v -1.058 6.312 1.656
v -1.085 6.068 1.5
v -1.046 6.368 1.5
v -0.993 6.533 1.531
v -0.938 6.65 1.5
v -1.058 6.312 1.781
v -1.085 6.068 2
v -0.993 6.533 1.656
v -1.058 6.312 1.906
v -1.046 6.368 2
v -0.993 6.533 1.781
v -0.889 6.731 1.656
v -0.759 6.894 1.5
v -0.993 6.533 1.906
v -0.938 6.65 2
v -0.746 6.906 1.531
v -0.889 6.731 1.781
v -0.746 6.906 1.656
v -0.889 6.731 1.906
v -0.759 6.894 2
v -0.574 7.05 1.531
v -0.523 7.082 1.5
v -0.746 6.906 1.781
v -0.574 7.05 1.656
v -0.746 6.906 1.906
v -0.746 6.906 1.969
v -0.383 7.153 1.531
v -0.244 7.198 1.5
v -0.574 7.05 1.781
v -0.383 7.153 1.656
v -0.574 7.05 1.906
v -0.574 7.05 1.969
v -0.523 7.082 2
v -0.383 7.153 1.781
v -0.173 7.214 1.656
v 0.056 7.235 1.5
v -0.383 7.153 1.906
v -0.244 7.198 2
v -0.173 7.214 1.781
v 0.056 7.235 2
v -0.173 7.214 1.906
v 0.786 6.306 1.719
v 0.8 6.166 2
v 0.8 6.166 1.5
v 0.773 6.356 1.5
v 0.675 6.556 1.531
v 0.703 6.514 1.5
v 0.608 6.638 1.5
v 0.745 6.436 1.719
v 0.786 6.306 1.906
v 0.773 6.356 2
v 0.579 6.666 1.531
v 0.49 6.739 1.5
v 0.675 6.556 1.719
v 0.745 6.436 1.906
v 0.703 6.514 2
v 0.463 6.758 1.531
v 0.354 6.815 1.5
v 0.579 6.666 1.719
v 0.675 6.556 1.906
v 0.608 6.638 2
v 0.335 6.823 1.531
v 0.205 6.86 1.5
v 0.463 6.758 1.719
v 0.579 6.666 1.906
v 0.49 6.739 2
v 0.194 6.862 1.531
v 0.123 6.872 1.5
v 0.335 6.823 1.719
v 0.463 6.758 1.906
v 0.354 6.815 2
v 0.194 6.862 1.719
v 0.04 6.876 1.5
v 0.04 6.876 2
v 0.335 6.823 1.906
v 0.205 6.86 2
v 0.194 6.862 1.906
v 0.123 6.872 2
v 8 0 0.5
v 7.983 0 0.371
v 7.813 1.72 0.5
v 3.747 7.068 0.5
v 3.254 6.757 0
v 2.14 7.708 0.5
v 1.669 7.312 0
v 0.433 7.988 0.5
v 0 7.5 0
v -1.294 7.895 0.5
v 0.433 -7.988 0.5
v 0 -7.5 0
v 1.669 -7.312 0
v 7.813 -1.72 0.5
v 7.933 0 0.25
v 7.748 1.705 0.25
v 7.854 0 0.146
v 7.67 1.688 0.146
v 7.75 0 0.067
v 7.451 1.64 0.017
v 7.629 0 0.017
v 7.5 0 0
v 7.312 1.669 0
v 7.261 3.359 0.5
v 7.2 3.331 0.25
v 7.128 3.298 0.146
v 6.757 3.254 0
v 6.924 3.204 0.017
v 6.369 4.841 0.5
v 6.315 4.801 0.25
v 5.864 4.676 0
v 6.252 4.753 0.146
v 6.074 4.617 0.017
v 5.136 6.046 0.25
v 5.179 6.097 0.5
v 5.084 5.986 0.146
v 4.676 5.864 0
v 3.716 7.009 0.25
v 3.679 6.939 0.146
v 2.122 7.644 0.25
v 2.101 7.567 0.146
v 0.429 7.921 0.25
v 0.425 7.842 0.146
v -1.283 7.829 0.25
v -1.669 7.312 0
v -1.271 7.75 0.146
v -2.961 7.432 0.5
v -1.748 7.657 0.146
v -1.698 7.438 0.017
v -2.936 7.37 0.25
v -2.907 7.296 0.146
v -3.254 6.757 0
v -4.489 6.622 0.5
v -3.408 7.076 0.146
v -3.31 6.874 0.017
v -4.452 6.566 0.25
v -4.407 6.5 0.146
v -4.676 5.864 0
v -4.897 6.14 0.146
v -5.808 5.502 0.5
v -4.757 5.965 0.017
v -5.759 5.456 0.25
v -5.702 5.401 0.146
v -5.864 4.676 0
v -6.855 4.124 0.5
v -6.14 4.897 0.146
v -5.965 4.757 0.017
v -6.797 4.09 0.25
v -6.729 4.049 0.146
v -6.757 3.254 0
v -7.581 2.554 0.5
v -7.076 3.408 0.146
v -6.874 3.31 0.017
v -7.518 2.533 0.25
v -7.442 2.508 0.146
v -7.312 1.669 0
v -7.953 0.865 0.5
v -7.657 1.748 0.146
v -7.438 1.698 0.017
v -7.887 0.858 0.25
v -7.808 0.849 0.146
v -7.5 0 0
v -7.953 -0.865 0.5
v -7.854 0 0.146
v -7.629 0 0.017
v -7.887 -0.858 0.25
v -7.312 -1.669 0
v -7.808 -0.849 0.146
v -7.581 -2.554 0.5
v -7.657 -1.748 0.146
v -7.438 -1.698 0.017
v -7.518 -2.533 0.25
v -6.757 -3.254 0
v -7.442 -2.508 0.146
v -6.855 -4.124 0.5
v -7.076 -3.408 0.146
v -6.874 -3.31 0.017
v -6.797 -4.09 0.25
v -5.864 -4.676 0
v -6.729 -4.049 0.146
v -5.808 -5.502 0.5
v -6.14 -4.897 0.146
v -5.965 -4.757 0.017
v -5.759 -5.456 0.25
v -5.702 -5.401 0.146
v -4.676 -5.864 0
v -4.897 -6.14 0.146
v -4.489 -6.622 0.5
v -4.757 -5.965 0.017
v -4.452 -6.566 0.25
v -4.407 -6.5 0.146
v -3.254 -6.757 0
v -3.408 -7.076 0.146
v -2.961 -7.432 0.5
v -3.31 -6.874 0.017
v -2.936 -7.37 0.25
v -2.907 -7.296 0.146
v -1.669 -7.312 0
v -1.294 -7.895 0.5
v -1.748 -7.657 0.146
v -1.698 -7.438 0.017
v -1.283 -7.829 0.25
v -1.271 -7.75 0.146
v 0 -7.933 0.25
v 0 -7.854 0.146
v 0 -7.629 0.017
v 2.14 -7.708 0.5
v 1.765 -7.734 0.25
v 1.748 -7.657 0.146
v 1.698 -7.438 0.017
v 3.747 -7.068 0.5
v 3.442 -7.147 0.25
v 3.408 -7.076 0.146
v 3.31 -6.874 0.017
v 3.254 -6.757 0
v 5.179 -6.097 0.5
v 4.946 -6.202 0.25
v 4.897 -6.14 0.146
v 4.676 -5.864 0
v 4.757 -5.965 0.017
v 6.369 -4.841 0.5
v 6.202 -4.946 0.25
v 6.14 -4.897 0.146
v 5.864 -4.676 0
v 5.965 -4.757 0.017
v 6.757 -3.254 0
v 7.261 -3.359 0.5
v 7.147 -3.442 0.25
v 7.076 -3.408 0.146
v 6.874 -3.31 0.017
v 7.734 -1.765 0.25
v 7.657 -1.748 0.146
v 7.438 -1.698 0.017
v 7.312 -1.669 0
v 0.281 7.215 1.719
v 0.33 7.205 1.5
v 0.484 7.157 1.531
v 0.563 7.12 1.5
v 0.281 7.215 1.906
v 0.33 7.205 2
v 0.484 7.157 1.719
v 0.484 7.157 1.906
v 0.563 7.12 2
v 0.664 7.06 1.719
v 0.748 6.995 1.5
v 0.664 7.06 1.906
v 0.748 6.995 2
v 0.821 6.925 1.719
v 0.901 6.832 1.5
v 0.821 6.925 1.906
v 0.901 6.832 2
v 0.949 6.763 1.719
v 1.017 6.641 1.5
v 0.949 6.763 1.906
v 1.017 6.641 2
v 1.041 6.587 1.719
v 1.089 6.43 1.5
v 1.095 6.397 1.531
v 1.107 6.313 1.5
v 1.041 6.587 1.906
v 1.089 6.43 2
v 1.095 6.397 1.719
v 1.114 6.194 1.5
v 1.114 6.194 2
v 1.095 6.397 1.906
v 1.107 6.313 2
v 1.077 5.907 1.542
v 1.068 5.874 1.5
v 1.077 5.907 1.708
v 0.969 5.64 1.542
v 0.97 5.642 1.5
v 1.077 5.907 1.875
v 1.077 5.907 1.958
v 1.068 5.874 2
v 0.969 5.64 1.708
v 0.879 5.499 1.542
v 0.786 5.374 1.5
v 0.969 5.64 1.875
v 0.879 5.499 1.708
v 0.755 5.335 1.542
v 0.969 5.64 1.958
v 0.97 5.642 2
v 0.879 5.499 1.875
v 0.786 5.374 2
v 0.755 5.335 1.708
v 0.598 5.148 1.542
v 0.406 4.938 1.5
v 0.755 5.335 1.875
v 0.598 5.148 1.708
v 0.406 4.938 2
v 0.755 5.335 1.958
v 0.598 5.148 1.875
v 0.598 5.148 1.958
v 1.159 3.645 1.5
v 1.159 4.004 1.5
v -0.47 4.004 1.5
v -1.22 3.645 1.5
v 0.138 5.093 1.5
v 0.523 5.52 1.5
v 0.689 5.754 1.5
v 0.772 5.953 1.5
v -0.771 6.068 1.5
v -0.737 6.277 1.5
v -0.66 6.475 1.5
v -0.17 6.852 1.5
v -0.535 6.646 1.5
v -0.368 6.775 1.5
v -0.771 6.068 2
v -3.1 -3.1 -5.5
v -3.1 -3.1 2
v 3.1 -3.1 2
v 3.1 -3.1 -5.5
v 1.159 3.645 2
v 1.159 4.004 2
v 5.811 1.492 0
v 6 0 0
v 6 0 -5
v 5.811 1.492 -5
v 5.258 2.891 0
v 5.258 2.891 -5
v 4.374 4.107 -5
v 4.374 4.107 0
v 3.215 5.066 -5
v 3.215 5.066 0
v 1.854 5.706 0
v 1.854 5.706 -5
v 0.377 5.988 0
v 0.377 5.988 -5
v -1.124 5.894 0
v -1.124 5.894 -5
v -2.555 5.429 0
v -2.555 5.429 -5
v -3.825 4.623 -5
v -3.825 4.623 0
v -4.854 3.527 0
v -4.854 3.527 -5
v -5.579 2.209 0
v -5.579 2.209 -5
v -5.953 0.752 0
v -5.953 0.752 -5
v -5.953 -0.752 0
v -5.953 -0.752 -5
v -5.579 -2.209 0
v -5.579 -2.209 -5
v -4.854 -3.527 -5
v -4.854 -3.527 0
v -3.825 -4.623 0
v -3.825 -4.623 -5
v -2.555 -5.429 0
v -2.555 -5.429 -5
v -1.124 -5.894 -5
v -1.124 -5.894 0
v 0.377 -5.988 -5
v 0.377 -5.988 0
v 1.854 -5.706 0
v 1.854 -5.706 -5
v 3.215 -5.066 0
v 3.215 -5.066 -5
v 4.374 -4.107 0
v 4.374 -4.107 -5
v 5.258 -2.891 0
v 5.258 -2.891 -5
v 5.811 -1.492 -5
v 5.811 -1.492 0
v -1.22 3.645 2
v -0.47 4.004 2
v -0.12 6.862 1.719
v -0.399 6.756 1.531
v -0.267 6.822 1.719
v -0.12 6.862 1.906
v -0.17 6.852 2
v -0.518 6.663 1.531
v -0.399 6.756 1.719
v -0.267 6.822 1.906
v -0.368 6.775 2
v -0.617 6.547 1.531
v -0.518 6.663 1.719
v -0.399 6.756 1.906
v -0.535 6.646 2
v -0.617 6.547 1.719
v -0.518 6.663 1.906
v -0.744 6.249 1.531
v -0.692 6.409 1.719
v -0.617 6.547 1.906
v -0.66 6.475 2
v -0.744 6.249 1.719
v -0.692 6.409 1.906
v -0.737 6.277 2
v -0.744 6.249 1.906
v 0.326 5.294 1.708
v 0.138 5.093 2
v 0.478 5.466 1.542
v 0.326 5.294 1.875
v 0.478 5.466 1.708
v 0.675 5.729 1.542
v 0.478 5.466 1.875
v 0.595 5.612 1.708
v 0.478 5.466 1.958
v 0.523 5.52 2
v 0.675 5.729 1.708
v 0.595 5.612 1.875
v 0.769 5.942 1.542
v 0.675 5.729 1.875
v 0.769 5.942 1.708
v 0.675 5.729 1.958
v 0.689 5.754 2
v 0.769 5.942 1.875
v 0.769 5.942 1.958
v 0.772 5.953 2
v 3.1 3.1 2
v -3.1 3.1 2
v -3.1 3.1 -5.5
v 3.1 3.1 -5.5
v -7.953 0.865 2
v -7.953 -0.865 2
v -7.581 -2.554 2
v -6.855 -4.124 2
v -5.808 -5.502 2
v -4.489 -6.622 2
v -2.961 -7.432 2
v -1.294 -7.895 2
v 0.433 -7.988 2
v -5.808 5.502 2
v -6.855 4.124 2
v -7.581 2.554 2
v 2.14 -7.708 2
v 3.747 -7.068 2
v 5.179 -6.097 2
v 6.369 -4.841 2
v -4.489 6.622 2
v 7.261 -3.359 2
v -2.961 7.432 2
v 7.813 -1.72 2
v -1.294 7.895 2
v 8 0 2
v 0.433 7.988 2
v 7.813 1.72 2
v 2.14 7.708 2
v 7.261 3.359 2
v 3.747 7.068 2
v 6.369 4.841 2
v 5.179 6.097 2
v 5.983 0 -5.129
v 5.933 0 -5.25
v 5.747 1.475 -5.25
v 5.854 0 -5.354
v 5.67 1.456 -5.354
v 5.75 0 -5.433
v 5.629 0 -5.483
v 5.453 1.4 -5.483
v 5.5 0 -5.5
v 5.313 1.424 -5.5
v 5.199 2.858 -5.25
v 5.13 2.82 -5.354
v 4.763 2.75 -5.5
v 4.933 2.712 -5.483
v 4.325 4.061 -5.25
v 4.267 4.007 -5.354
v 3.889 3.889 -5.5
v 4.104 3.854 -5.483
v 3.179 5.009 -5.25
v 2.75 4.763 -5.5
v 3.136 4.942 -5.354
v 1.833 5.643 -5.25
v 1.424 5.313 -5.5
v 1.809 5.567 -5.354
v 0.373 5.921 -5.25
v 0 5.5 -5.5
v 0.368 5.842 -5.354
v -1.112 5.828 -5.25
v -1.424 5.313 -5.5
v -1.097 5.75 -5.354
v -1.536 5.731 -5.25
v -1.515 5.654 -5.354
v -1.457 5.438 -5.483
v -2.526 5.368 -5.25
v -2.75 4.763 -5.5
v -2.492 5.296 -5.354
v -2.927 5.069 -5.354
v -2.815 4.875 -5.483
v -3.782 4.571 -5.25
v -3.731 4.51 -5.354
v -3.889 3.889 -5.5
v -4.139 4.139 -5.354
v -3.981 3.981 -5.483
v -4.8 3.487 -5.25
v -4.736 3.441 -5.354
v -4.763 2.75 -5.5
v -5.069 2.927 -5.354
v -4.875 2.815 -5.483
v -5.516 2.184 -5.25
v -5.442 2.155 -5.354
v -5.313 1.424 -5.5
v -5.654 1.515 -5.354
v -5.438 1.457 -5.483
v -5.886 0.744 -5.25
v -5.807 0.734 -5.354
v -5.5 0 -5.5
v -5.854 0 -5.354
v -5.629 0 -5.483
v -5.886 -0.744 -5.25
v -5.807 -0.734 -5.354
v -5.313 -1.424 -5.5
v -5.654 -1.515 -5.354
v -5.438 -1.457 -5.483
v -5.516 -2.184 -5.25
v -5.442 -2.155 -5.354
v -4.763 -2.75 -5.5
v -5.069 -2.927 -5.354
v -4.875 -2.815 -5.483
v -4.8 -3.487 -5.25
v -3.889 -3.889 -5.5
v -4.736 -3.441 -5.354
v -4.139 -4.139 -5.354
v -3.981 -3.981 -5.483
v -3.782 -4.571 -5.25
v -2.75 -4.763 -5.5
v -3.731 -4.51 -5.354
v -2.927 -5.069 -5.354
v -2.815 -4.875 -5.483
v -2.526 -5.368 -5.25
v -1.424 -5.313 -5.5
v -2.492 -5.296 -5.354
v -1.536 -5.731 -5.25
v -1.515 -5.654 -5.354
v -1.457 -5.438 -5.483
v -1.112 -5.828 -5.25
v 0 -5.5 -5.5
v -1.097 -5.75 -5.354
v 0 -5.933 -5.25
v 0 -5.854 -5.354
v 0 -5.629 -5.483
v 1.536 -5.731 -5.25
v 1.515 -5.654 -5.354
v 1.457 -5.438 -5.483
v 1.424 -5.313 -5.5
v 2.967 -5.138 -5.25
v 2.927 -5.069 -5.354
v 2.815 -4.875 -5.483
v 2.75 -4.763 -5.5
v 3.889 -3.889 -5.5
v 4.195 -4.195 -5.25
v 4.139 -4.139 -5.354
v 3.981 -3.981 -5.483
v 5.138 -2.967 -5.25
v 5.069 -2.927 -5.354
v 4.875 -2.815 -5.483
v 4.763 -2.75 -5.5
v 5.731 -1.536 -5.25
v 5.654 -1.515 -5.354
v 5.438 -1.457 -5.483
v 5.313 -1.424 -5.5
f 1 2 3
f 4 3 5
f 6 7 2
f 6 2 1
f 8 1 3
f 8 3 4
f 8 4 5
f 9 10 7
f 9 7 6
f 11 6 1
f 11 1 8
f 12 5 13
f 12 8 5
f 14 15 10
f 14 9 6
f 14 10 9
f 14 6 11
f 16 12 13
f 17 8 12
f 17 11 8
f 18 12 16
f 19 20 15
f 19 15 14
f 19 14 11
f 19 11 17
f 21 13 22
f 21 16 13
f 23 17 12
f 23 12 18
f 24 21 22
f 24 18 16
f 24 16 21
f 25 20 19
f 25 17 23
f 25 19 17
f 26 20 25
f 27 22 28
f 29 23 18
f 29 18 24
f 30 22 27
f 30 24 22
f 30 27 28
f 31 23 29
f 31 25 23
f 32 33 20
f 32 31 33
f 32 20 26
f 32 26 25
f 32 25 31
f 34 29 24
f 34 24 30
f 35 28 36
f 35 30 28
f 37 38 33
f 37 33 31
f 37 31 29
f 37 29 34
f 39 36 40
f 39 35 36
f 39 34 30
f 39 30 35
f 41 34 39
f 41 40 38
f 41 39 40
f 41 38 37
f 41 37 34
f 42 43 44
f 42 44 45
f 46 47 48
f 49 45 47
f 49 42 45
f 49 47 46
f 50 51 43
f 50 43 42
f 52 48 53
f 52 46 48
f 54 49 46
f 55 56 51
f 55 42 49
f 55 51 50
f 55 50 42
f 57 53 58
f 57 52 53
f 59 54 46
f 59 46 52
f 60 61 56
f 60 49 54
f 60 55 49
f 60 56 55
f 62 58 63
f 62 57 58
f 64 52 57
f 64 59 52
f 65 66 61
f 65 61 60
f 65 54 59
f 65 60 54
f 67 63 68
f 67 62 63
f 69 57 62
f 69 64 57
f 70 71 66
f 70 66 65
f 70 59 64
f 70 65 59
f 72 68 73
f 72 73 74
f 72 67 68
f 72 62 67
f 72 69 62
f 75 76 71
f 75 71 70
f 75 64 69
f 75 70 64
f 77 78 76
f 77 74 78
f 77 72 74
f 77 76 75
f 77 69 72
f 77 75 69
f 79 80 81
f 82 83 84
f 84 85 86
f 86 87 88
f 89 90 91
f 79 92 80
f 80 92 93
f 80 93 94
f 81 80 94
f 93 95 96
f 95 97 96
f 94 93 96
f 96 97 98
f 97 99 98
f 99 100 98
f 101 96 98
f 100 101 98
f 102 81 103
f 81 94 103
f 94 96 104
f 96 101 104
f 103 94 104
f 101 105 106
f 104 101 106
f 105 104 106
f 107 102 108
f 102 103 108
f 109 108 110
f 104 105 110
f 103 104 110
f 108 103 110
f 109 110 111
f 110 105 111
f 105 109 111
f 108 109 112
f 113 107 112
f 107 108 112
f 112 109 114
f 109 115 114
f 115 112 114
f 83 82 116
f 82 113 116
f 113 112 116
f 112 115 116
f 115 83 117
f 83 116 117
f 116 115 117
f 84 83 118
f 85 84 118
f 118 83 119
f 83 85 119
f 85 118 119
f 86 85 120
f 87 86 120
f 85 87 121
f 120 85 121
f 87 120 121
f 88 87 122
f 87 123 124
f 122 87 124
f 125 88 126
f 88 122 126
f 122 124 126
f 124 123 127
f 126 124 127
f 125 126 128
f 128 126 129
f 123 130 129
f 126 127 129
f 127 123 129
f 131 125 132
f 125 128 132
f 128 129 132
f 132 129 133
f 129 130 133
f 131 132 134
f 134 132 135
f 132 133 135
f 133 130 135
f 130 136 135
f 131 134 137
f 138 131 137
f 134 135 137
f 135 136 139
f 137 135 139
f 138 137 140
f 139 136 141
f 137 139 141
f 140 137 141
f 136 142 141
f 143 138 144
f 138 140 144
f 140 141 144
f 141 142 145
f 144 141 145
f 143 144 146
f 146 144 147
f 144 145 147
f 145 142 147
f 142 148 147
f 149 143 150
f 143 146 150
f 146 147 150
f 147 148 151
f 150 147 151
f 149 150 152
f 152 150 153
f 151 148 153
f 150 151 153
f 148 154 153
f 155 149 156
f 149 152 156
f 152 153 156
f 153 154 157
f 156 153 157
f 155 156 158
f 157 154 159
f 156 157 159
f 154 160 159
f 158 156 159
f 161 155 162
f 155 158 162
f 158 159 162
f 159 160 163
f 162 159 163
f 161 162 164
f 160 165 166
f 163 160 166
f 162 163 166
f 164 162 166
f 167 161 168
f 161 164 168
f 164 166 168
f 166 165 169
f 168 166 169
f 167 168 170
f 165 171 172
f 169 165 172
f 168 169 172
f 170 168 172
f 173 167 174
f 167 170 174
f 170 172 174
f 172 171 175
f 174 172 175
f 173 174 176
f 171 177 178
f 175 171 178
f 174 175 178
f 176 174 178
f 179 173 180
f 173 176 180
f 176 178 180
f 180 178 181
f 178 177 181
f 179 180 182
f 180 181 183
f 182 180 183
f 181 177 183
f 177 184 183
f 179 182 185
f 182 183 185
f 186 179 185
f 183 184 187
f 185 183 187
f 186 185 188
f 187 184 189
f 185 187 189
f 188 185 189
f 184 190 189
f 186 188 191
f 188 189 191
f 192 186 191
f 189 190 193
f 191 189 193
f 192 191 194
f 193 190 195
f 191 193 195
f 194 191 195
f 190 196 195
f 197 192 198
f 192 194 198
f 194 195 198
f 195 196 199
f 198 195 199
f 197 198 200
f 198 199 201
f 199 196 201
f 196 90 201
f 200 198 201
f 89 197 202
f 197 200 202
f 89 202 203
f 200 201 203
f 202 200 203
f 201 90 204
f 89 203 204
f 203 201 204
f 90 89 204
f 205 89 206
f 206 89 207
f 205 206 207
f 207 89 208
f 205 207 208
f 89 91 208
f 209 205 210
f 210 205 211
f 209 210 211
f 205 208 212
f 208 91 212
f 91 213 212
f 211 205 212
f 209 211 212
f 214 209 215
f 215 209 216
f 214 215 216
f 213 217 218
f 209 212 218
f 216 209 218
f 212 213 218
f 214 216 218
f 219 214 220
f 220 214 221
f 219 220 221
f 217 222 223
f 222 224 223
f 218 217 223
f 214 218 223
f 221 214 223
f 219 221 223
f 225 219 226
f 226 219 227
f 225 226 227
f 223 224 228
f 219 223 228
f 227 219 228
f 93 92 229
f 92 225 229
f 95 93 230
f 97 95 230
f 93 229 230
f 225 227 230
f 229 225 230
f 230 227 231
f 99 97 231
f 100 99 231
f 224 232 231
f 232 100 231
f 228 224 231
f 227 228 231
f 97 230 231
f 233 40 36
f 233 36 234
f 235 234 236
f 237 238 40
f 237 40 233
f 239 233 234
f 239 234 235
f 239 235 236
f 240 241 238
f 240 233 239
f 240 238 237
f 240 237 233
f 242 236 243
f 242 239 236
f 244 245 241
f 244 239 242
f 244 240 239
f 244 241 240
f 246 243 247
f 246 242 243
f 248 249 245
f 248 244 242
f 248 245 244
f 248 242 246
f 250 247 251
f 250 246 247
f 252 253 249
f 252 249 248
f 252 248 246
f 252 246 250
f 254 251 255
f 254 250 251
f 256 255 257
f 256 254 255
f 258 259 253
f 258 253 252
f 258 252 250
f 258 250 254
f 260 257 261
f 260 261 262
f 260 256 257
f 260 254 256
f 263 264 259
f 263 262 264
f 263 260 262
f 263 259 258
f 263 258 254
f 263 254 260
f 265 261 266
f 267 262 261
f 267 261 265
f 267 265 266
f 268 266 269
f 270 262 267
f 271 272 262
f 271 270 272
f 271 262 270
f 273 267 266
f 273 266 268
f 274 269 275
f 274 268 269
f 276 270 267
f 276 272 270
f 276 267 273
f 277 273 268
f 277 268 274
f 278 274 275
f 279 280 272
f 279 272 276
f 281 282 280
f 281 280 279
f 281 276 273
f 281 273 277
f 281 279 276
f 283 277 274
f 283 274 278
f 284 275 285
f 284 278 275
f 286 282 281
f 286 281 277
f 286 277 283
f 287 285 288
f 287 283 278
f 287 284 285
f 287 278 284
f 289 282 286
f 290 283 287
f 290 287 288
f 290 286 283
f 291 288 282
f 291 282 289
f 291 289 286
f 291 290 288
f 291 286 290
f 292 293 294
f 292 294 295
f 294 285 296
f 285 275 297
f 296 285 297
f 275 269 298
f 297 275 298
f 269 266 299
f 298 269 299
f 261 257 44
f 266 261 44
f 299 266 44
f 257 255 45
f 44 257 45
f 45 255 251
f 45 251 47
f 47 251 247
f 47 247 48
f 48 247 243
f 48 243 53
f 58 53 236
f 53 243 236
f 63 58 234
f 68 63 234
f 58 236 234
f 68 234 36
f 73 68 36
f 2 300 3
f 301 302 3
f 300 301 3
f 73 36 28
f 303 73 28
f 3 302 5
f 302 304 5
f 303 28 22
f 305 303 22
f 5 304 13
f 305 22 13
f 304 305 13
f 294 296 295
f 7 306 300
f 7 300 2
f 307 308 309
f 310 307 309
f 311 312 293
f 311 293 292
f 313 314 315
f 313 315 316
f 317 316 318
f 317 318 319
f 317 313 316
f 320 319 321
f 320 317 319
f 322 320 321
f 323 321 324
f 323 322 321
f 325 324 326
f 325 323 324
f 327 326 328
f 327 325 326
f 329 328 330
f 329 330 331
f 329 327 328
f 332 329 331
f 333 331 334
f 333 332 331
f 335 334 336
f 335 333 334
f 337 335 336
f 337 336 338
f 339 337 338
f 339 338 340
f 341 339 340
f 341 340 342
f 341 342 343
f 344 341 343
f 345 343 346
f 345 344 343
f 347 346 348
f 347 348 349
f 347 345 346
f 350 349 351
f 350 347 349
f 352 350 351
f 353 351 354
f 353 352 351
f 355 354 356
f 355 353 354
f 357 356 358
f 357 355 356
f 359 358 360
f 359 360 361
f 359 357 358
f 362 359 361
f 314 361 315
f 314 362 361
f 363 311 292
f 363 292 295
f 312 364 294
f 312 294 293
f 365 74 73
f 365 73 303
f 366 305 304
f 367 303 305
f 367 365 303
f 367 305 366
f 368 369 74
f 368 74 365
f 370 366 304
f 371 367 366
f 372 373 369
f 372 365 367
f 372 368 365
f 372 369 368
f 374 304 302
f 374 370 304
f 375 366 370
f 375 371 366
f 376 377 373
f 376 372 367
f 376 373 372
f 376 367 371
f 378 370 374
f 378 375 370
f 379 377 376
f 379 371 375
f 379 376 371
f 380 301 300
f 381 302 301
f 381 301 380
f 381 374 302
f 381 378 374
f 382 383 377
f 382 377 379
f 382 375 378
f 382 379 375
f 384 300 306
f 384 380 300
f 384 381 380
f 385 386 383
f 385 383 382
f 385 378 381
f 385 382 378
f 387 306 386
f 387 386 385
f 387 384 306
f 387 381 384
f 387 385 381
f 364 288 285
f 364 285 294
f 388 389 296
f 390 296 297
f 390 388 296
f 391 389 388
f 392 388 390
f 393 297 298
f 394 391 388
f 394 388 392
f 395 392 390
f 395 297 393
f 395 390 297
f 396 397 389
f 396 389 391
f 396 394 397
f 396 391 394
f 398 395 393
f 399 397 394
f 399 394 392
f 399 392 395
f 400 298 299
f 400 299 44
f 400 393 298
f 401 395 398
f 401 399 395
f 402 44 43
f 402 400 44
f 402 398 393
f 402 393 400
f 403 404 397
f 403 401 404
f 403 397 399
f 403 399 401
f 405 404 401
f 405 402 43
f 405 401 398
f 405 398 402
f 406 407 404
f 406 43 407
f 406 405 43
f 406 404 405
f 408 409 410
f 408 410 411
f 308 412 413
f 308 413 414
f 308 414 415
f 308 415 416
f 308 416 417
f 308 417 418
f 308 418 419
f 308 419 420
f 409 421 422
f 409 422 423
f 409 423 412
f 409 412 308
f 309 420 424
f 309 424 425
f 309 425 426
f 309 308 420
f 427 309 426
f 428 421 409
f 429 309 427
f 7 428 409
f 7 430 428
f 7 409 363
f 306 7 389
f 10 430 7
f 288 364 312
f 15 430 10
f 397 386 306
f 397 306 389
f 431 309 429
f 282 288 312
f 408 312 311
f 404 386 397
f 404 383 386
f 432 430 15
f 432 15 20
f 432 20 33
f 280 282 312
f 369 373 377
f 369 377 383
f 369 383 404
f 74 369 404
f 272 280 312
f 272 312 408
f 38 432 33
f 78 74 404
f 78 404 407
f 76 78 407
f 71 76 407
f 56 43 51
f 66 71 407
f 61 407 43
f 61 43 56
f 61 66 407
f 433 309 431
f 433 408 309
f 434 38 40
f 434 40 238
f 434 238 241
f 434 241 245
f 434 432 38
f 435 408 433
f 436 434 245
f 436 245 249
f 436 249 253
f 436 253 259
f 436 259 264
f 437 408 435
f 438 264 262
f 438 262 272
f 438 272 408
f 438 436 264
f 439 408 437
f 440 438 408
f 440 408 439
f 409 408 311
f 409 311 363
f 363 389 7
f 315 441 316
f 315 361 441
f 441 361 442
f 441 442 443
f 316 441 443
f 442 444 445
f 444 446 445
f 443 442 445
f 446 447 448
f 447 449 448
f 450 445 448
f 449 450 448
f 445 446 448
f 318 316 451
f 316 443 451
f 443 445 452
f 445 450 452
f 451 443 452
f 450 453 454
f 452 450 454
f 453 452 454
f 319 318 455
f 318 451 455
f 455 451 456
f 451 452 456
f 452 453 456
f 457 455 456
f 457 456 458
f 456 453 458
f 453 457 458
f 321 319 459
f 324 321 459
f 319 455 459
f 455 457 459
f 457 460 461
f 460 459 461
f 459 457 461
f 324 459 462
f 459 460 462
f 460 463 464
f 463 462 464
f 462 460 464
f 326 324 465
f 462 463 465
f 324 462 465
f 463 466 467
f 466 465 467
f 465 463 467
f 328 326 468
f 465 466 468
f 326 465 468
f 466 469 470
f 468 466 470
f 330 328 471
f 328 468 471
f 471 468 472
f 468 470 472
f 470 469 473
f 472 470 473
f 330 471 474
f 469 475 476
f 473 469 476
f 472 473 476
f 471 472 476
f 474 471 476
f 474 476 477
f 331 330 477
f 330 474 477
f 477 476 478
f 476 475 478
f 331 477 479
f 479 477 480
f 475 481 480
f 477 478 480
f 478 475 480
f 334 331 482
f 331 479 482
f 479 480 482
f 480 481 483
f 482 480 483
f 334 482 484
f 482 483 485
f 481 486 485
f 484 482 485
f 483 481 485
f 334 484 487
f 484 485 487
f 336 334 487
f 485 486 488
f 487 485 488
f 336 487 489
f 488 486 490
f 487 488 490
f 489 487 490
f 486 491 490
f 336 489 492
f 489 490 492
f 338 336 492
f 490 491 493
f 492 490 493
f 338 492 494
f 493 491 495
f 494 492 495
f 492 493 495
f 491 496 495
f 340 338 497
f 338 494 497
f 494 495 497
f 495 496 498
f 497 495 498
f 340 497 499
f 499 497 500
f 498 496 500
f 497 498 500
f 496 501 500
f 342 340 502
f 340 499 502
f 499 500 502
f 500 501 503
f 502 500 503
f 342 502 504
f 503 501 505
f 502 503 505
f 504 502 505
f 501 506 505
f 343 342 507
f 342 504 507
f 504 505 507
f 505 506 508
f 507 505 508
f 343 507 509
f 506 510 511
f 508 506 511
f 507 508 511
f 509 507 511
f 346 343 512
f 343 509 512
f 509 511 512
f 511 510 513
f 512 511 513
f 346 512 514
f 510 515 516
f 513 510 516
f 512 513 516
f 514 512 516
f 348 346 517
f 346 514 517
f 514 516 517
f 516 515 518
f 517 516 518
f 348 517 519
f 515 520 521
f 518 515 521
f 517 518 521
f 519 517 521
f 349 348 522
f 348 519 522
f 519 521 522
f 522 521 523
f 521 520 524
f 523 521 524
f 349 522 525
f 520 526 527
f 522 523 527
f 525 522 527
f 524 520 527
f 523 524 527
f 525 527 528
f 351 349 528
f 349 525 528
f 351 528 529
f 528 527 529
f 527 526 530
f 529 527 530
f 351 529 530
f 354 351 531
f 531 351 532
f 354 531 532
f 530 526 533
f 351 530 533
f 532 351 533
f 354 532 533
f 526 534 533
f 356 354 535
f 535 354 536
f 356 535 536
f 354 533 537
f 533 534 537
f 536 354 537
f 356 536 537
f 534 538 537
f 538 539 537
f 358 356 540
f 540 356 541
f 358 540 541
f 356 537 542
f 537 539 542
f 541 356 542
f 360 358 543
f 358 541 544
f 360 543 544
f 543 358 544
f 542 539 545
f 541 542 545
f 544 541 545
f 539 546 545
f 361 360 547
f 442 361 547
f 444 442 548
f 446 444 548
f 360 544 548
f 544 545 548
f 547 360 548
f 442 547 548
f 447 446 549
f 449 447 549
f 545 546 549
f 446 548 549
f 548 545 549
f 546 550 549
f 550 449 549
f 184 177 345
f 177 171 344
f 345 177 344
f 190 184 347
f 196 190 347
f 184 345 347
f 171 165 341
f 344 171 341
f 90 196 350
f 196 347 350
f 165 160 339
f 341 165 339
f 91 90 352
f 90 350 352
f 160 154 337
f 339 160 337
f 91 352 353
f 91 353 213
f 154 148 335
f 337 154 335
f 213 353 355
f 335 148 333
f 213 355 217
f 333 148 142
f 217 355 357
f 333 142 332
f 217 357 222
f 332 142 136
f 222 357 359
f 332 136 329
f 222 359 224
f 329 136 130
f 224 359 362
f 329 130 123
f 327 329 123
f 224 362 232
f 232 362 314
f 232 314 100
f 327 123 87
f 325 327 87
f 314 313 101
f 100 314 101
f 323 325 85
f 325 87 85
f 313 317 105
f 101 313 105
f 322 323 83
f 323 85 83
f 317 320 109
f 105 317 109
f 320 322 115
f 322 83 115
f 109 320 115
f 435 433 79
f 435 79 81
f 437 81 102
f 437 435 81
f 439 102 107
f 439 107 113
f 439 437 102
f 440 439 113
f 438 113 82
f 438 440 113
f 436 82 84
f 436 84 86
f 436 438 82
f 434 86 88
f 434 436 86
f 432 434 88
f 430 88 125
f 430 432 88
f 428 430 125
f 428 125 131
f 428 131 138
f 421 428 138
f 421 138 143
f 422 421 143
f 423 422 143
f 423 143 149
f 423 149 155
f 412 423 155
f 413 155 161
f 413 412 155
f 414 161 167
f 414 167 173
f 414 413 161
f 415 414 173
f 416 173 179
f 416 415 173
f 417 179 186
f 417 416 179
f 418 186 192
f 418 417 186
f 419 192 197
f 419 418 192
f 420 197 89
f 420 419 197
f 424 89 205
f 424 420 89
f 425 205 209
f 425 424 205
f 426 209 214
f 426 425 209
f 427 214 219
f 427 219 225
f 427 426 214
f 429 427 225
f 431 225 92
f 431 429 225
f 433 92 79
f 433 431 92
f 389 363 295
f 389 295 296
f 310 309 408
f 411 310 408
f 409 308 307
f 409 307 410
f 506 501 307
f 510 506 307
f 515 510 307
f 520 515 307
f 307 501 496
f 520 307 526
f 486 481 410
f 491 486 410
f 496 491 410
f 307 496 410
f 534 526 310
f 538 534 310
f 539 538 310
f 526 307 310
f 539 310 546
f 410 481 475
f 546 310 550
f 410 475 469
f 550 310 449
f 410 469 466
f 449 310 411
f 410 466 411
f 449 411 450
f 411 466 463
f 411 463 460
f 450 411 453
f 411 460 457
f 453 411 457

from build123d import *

# Parameters (mm, degrees)
SKETCH1_R           = 6
SKETCH1_W           = 6.2
SKETCH1_H           = 6.2
BOSS_EXTRUDE1_DEPTH = 5.5
SKETCH1_3_R         = 8
SKETCH1_3_W         = 6.2
SKETCH1_3_H         = 6.2
BOSS_EXTRUDE2_DEPTH = 2
FILLET1_R           = 0.5
CUT_EXTRUDE1_DEPTH  = 0.5


with BuildPart() as part:
    # Sketch1 → Boss-Extrude1 (new body)
    with BuildSketch(Plane.XY):
        Circle(SKETCH1_R)
        Rectangle(SKETCH1_W, SKETCH1_H, mode=Mode.SUBTRACT)
    extrude(amount=-BOSS_EXTRUDE1_DEPTH)

    # Sketch1<3> → Boss-Extrude2 (add)
    with BuildSketch(Plane.XY):
        Circle(SKETCH1_3_R)
        Rectangle(SKETCH1_3_W, SKETCH1_3_H, mode=Mode.SUBTRACT)
    extrude(amount=BOSS_EXTRUDE2_DEPTH)

    # Fillet1
    fillet1_edges = [part.edges().sort_by_distance(p)[0] for p in [
        (-8, 0, 0),
        (-6, 0, -5.5),
    ]]
    fillet(fillet1_edges, radius=FILLET1_R)

    # Sketch2 → Cut-Extrude1 (cut)
    with BuildSketch(Plane.XY.offset(2)):
        with BuildLine():
            Line((-0.770976701, 6.067937408), (-1.085079266, 6.067937408))
            add(Edge.make_bspline(
                [(-1.085079266, 6.067937408), (-1.083032113, 6.109608296), (-1.079011558, 6.19144881), (-1.060183269, 6.310772717), (-1.033242392, 6.424827515), (-0.995150938, 6.532697429), (-0.94784466, 6.635336237), (-0.891114633, 6.732336252), (-0.823920782, 6.823327441), (-0.747714048, 6.907466284), (-0.664945409, 6.984653855), (-0.57563947, 7.051309098), (-0.481794442, 7.107626769), (-0.383695044, 7.154708011), (-0.28023448, 7.190047857), (-0.172351622, 7.216269497), (-0.059572486, 7.232045842), (0.017267536, 7.233741628), (0.056347017, 7.234604075)],
                knots=[0, 0, 0, 0, 1.10065271, 2.161652631, 3.183658789, 4.190468796, 5.17591951, 6.163126047, 7.15150782, 8.156236427, 9.156009102, 10.134482811, 11.092018607, 12.041330605, 13.001268258, 13.972401359, 14.968799086, 16, 16, 16, 16], degree=3))
            add(Edge.make_bspline(
                [(0.056347017, 7.234604075), (0.094725091, 7.233705618), (0.170136635, 7.231940183), (0.28019865, 7.216779154), (0.384975944, 7.193033562), (0.484263711, 7.159718146), (0.577269775, 7.114933719), (0.66469282, 7.06113618), (0.747573631, 6.998916349), (0.822180414, 6.925662535), (0.890688493, 6.847460151), (0.949790749, 6.763972247), (1.000403912, 6.677742961), (1.042591592, 6.58811476), (1.073647731, 6.494243731), (1.097225939, 6.397496529), (1.110553353, 6.296871718), (1.112598776, 6.228765162), (1.113638683, 6.194139331)],
                knots=[0, 0, 0, 0, 1.111607364, 2.184268762, 3.212621178, 4.221274766, 5.211760367, 6.196651075, 7.1921475, 8.207485113, 9.220403448, 10.201281604, 11.166441695, 12.114753415, 13.065576456, 14.026450734, 14.996634279, 16, 16, 16, 16], degree=3))
            add(Edge.make_bspline(
                [(1.113638683, 6.194139331), (1.11194542, 6.145391496), (1.108588609, 6.048751283), (1.079874232, 5.90673642), (1.035027721, 5.769143001), (0.981030364, 5.658405699), (0.92655792, 5.569172205), (0.877470413, 5.4957035), (0.820005602, 5.416598032), (0.753327104, 5.332120694), (0.678814232, 5.241609789), (0.595792068, 5.145119994), (0.503668586, 5.043648224), (0.439010086, 4.974342623), (0.40550567, 4.938430196)],
                knots=[0, 0, 0, 0, 1.184426356, 2.348067706, 3.509069118, 4.696110526, 5.333549288, 6.050745305, 6.844228056, 7.710549037, 8.667450064, 9.695053472, 10.805634456, 12, 12, 12, 12], degree=3))
            Line((0.40550567, 4.938430196), (-0.470195451, 4.003834844))
            Line((-0.470195451, 4.003834844), (1.158510478, 4.003834844))
            Line((1.158510478, 4.003834844), (1.158510478, 3.644860485))
            Line((1.158510478, 3.644860485), (-1.21969465, 3.644860485))
            Line((-1.21969465, 3.644860485), (0.137677145, 5.093378113))
            add(Edge.make_bspline(
                [(0.137677145, 5.093378113), (0.170725032, 5.12787642), (0.234203259, 5.194140606), (0.323985835, 5.290883566), (0.404624824, 5.380633107), (0.476642217, 5.463219656), (0.538475722, 5.539851223), (0.593347954, 5.608045927), (0.637313545, 5.670800377), (0.685028941, 5.743540991), (0.731242922, 5.832353308), (0.770955278, 5.940886998), (0.795170126, 6.05261425), (0.798074962, 6.128116287), (0.799536119, 6.166094459)],
                knots=[0, 0, 0, 0, 1.329631726, 2.553950428, 3.673215718, 4.687767853, 5.603093632, 6.413772471, 7.123043292, 7.734684054, 8.834405432, 9.900288307, 10.943827018, 12, 12, 12, 12], degree=3))
            add(Edge.make_bspline(
                [(0.799536119, 6.166094459), (0.798900377, 6.189975858), (0.797647451, 6.237041508), (0.786589753, 6.306047267), (0.769879247, 6.372612081), (0.745933989, 6.4369407), (0.714327249, 6.498386352), (0.675853869, 6.557023832), (0.631463806, 6.613712797), (0.580112536, 6.666866095), (0.523701017, 6.715547301), (0.464106767, 6.758671386), (0.401056663, 6.794710497), (0.334816541, 6.824253994), (0.265571071, 6.847429376), (0.193186326, 6.863487955), (0.11786231, 6.873570439), (0.066428814, 6.874934611), (0.040221215, 6.875629716)],
                knots=[0, 0, 0, 0, 0.991446411, 1.95395049, 2.89581595, 3.838931463, 4.798493298, 5.75982156, 6.748411868, 7.785213223, 8.824556874, 9.840280684, 10.836137867, 11.835679398, 12.848801643, 13.863922112, 14.911575587, 16, 16, 16, 16], degree=3))
            add(Edge.make_bspline(
                [(0.040221215, 6.875629716), (0.012850382, 6.874914683), (-0.040901414, 6.873510478), (-0.119820447, 6.863687814), (-0.195106224, 6.846741974), (-0.266948127, 6.823565299), (-0.335467713, 6.79410675), (-0.400331757, 6.757415006), (-0.461394646, 6.713631513), (-0.51877117, 6.663990956), (-0.571635149, 6.608723355), (-0.618082025, 6.547113392), (-0.658666039, 6.480285977), (-0.694075272, 6.408421426), (-0.722830962, 6.330867646), (-0.744804113, 6.247899941), (-0.762190959, 6.15987856), (-0.76799948, 6.099093475), (-0.770976701, 6.067937408)],
                knots=[0, 0, 0, 0, 1.031018746, 2.02475058, 2.990194455, 3.934040569, 4.864654155, 5.795059489, 6.735614925, 7.690564532, 8.649604399, 9.611025574, 10.590972636, 11.591080095, 12.624614302, 13.701020113, 14.821632451, 16, 16, 16, 16], degree=3))
        make_face()
    extrude(amount=-CUT_EXTRUDE1_DEPTH, mode=Mode.SUBTRACT)


solid = part.part
